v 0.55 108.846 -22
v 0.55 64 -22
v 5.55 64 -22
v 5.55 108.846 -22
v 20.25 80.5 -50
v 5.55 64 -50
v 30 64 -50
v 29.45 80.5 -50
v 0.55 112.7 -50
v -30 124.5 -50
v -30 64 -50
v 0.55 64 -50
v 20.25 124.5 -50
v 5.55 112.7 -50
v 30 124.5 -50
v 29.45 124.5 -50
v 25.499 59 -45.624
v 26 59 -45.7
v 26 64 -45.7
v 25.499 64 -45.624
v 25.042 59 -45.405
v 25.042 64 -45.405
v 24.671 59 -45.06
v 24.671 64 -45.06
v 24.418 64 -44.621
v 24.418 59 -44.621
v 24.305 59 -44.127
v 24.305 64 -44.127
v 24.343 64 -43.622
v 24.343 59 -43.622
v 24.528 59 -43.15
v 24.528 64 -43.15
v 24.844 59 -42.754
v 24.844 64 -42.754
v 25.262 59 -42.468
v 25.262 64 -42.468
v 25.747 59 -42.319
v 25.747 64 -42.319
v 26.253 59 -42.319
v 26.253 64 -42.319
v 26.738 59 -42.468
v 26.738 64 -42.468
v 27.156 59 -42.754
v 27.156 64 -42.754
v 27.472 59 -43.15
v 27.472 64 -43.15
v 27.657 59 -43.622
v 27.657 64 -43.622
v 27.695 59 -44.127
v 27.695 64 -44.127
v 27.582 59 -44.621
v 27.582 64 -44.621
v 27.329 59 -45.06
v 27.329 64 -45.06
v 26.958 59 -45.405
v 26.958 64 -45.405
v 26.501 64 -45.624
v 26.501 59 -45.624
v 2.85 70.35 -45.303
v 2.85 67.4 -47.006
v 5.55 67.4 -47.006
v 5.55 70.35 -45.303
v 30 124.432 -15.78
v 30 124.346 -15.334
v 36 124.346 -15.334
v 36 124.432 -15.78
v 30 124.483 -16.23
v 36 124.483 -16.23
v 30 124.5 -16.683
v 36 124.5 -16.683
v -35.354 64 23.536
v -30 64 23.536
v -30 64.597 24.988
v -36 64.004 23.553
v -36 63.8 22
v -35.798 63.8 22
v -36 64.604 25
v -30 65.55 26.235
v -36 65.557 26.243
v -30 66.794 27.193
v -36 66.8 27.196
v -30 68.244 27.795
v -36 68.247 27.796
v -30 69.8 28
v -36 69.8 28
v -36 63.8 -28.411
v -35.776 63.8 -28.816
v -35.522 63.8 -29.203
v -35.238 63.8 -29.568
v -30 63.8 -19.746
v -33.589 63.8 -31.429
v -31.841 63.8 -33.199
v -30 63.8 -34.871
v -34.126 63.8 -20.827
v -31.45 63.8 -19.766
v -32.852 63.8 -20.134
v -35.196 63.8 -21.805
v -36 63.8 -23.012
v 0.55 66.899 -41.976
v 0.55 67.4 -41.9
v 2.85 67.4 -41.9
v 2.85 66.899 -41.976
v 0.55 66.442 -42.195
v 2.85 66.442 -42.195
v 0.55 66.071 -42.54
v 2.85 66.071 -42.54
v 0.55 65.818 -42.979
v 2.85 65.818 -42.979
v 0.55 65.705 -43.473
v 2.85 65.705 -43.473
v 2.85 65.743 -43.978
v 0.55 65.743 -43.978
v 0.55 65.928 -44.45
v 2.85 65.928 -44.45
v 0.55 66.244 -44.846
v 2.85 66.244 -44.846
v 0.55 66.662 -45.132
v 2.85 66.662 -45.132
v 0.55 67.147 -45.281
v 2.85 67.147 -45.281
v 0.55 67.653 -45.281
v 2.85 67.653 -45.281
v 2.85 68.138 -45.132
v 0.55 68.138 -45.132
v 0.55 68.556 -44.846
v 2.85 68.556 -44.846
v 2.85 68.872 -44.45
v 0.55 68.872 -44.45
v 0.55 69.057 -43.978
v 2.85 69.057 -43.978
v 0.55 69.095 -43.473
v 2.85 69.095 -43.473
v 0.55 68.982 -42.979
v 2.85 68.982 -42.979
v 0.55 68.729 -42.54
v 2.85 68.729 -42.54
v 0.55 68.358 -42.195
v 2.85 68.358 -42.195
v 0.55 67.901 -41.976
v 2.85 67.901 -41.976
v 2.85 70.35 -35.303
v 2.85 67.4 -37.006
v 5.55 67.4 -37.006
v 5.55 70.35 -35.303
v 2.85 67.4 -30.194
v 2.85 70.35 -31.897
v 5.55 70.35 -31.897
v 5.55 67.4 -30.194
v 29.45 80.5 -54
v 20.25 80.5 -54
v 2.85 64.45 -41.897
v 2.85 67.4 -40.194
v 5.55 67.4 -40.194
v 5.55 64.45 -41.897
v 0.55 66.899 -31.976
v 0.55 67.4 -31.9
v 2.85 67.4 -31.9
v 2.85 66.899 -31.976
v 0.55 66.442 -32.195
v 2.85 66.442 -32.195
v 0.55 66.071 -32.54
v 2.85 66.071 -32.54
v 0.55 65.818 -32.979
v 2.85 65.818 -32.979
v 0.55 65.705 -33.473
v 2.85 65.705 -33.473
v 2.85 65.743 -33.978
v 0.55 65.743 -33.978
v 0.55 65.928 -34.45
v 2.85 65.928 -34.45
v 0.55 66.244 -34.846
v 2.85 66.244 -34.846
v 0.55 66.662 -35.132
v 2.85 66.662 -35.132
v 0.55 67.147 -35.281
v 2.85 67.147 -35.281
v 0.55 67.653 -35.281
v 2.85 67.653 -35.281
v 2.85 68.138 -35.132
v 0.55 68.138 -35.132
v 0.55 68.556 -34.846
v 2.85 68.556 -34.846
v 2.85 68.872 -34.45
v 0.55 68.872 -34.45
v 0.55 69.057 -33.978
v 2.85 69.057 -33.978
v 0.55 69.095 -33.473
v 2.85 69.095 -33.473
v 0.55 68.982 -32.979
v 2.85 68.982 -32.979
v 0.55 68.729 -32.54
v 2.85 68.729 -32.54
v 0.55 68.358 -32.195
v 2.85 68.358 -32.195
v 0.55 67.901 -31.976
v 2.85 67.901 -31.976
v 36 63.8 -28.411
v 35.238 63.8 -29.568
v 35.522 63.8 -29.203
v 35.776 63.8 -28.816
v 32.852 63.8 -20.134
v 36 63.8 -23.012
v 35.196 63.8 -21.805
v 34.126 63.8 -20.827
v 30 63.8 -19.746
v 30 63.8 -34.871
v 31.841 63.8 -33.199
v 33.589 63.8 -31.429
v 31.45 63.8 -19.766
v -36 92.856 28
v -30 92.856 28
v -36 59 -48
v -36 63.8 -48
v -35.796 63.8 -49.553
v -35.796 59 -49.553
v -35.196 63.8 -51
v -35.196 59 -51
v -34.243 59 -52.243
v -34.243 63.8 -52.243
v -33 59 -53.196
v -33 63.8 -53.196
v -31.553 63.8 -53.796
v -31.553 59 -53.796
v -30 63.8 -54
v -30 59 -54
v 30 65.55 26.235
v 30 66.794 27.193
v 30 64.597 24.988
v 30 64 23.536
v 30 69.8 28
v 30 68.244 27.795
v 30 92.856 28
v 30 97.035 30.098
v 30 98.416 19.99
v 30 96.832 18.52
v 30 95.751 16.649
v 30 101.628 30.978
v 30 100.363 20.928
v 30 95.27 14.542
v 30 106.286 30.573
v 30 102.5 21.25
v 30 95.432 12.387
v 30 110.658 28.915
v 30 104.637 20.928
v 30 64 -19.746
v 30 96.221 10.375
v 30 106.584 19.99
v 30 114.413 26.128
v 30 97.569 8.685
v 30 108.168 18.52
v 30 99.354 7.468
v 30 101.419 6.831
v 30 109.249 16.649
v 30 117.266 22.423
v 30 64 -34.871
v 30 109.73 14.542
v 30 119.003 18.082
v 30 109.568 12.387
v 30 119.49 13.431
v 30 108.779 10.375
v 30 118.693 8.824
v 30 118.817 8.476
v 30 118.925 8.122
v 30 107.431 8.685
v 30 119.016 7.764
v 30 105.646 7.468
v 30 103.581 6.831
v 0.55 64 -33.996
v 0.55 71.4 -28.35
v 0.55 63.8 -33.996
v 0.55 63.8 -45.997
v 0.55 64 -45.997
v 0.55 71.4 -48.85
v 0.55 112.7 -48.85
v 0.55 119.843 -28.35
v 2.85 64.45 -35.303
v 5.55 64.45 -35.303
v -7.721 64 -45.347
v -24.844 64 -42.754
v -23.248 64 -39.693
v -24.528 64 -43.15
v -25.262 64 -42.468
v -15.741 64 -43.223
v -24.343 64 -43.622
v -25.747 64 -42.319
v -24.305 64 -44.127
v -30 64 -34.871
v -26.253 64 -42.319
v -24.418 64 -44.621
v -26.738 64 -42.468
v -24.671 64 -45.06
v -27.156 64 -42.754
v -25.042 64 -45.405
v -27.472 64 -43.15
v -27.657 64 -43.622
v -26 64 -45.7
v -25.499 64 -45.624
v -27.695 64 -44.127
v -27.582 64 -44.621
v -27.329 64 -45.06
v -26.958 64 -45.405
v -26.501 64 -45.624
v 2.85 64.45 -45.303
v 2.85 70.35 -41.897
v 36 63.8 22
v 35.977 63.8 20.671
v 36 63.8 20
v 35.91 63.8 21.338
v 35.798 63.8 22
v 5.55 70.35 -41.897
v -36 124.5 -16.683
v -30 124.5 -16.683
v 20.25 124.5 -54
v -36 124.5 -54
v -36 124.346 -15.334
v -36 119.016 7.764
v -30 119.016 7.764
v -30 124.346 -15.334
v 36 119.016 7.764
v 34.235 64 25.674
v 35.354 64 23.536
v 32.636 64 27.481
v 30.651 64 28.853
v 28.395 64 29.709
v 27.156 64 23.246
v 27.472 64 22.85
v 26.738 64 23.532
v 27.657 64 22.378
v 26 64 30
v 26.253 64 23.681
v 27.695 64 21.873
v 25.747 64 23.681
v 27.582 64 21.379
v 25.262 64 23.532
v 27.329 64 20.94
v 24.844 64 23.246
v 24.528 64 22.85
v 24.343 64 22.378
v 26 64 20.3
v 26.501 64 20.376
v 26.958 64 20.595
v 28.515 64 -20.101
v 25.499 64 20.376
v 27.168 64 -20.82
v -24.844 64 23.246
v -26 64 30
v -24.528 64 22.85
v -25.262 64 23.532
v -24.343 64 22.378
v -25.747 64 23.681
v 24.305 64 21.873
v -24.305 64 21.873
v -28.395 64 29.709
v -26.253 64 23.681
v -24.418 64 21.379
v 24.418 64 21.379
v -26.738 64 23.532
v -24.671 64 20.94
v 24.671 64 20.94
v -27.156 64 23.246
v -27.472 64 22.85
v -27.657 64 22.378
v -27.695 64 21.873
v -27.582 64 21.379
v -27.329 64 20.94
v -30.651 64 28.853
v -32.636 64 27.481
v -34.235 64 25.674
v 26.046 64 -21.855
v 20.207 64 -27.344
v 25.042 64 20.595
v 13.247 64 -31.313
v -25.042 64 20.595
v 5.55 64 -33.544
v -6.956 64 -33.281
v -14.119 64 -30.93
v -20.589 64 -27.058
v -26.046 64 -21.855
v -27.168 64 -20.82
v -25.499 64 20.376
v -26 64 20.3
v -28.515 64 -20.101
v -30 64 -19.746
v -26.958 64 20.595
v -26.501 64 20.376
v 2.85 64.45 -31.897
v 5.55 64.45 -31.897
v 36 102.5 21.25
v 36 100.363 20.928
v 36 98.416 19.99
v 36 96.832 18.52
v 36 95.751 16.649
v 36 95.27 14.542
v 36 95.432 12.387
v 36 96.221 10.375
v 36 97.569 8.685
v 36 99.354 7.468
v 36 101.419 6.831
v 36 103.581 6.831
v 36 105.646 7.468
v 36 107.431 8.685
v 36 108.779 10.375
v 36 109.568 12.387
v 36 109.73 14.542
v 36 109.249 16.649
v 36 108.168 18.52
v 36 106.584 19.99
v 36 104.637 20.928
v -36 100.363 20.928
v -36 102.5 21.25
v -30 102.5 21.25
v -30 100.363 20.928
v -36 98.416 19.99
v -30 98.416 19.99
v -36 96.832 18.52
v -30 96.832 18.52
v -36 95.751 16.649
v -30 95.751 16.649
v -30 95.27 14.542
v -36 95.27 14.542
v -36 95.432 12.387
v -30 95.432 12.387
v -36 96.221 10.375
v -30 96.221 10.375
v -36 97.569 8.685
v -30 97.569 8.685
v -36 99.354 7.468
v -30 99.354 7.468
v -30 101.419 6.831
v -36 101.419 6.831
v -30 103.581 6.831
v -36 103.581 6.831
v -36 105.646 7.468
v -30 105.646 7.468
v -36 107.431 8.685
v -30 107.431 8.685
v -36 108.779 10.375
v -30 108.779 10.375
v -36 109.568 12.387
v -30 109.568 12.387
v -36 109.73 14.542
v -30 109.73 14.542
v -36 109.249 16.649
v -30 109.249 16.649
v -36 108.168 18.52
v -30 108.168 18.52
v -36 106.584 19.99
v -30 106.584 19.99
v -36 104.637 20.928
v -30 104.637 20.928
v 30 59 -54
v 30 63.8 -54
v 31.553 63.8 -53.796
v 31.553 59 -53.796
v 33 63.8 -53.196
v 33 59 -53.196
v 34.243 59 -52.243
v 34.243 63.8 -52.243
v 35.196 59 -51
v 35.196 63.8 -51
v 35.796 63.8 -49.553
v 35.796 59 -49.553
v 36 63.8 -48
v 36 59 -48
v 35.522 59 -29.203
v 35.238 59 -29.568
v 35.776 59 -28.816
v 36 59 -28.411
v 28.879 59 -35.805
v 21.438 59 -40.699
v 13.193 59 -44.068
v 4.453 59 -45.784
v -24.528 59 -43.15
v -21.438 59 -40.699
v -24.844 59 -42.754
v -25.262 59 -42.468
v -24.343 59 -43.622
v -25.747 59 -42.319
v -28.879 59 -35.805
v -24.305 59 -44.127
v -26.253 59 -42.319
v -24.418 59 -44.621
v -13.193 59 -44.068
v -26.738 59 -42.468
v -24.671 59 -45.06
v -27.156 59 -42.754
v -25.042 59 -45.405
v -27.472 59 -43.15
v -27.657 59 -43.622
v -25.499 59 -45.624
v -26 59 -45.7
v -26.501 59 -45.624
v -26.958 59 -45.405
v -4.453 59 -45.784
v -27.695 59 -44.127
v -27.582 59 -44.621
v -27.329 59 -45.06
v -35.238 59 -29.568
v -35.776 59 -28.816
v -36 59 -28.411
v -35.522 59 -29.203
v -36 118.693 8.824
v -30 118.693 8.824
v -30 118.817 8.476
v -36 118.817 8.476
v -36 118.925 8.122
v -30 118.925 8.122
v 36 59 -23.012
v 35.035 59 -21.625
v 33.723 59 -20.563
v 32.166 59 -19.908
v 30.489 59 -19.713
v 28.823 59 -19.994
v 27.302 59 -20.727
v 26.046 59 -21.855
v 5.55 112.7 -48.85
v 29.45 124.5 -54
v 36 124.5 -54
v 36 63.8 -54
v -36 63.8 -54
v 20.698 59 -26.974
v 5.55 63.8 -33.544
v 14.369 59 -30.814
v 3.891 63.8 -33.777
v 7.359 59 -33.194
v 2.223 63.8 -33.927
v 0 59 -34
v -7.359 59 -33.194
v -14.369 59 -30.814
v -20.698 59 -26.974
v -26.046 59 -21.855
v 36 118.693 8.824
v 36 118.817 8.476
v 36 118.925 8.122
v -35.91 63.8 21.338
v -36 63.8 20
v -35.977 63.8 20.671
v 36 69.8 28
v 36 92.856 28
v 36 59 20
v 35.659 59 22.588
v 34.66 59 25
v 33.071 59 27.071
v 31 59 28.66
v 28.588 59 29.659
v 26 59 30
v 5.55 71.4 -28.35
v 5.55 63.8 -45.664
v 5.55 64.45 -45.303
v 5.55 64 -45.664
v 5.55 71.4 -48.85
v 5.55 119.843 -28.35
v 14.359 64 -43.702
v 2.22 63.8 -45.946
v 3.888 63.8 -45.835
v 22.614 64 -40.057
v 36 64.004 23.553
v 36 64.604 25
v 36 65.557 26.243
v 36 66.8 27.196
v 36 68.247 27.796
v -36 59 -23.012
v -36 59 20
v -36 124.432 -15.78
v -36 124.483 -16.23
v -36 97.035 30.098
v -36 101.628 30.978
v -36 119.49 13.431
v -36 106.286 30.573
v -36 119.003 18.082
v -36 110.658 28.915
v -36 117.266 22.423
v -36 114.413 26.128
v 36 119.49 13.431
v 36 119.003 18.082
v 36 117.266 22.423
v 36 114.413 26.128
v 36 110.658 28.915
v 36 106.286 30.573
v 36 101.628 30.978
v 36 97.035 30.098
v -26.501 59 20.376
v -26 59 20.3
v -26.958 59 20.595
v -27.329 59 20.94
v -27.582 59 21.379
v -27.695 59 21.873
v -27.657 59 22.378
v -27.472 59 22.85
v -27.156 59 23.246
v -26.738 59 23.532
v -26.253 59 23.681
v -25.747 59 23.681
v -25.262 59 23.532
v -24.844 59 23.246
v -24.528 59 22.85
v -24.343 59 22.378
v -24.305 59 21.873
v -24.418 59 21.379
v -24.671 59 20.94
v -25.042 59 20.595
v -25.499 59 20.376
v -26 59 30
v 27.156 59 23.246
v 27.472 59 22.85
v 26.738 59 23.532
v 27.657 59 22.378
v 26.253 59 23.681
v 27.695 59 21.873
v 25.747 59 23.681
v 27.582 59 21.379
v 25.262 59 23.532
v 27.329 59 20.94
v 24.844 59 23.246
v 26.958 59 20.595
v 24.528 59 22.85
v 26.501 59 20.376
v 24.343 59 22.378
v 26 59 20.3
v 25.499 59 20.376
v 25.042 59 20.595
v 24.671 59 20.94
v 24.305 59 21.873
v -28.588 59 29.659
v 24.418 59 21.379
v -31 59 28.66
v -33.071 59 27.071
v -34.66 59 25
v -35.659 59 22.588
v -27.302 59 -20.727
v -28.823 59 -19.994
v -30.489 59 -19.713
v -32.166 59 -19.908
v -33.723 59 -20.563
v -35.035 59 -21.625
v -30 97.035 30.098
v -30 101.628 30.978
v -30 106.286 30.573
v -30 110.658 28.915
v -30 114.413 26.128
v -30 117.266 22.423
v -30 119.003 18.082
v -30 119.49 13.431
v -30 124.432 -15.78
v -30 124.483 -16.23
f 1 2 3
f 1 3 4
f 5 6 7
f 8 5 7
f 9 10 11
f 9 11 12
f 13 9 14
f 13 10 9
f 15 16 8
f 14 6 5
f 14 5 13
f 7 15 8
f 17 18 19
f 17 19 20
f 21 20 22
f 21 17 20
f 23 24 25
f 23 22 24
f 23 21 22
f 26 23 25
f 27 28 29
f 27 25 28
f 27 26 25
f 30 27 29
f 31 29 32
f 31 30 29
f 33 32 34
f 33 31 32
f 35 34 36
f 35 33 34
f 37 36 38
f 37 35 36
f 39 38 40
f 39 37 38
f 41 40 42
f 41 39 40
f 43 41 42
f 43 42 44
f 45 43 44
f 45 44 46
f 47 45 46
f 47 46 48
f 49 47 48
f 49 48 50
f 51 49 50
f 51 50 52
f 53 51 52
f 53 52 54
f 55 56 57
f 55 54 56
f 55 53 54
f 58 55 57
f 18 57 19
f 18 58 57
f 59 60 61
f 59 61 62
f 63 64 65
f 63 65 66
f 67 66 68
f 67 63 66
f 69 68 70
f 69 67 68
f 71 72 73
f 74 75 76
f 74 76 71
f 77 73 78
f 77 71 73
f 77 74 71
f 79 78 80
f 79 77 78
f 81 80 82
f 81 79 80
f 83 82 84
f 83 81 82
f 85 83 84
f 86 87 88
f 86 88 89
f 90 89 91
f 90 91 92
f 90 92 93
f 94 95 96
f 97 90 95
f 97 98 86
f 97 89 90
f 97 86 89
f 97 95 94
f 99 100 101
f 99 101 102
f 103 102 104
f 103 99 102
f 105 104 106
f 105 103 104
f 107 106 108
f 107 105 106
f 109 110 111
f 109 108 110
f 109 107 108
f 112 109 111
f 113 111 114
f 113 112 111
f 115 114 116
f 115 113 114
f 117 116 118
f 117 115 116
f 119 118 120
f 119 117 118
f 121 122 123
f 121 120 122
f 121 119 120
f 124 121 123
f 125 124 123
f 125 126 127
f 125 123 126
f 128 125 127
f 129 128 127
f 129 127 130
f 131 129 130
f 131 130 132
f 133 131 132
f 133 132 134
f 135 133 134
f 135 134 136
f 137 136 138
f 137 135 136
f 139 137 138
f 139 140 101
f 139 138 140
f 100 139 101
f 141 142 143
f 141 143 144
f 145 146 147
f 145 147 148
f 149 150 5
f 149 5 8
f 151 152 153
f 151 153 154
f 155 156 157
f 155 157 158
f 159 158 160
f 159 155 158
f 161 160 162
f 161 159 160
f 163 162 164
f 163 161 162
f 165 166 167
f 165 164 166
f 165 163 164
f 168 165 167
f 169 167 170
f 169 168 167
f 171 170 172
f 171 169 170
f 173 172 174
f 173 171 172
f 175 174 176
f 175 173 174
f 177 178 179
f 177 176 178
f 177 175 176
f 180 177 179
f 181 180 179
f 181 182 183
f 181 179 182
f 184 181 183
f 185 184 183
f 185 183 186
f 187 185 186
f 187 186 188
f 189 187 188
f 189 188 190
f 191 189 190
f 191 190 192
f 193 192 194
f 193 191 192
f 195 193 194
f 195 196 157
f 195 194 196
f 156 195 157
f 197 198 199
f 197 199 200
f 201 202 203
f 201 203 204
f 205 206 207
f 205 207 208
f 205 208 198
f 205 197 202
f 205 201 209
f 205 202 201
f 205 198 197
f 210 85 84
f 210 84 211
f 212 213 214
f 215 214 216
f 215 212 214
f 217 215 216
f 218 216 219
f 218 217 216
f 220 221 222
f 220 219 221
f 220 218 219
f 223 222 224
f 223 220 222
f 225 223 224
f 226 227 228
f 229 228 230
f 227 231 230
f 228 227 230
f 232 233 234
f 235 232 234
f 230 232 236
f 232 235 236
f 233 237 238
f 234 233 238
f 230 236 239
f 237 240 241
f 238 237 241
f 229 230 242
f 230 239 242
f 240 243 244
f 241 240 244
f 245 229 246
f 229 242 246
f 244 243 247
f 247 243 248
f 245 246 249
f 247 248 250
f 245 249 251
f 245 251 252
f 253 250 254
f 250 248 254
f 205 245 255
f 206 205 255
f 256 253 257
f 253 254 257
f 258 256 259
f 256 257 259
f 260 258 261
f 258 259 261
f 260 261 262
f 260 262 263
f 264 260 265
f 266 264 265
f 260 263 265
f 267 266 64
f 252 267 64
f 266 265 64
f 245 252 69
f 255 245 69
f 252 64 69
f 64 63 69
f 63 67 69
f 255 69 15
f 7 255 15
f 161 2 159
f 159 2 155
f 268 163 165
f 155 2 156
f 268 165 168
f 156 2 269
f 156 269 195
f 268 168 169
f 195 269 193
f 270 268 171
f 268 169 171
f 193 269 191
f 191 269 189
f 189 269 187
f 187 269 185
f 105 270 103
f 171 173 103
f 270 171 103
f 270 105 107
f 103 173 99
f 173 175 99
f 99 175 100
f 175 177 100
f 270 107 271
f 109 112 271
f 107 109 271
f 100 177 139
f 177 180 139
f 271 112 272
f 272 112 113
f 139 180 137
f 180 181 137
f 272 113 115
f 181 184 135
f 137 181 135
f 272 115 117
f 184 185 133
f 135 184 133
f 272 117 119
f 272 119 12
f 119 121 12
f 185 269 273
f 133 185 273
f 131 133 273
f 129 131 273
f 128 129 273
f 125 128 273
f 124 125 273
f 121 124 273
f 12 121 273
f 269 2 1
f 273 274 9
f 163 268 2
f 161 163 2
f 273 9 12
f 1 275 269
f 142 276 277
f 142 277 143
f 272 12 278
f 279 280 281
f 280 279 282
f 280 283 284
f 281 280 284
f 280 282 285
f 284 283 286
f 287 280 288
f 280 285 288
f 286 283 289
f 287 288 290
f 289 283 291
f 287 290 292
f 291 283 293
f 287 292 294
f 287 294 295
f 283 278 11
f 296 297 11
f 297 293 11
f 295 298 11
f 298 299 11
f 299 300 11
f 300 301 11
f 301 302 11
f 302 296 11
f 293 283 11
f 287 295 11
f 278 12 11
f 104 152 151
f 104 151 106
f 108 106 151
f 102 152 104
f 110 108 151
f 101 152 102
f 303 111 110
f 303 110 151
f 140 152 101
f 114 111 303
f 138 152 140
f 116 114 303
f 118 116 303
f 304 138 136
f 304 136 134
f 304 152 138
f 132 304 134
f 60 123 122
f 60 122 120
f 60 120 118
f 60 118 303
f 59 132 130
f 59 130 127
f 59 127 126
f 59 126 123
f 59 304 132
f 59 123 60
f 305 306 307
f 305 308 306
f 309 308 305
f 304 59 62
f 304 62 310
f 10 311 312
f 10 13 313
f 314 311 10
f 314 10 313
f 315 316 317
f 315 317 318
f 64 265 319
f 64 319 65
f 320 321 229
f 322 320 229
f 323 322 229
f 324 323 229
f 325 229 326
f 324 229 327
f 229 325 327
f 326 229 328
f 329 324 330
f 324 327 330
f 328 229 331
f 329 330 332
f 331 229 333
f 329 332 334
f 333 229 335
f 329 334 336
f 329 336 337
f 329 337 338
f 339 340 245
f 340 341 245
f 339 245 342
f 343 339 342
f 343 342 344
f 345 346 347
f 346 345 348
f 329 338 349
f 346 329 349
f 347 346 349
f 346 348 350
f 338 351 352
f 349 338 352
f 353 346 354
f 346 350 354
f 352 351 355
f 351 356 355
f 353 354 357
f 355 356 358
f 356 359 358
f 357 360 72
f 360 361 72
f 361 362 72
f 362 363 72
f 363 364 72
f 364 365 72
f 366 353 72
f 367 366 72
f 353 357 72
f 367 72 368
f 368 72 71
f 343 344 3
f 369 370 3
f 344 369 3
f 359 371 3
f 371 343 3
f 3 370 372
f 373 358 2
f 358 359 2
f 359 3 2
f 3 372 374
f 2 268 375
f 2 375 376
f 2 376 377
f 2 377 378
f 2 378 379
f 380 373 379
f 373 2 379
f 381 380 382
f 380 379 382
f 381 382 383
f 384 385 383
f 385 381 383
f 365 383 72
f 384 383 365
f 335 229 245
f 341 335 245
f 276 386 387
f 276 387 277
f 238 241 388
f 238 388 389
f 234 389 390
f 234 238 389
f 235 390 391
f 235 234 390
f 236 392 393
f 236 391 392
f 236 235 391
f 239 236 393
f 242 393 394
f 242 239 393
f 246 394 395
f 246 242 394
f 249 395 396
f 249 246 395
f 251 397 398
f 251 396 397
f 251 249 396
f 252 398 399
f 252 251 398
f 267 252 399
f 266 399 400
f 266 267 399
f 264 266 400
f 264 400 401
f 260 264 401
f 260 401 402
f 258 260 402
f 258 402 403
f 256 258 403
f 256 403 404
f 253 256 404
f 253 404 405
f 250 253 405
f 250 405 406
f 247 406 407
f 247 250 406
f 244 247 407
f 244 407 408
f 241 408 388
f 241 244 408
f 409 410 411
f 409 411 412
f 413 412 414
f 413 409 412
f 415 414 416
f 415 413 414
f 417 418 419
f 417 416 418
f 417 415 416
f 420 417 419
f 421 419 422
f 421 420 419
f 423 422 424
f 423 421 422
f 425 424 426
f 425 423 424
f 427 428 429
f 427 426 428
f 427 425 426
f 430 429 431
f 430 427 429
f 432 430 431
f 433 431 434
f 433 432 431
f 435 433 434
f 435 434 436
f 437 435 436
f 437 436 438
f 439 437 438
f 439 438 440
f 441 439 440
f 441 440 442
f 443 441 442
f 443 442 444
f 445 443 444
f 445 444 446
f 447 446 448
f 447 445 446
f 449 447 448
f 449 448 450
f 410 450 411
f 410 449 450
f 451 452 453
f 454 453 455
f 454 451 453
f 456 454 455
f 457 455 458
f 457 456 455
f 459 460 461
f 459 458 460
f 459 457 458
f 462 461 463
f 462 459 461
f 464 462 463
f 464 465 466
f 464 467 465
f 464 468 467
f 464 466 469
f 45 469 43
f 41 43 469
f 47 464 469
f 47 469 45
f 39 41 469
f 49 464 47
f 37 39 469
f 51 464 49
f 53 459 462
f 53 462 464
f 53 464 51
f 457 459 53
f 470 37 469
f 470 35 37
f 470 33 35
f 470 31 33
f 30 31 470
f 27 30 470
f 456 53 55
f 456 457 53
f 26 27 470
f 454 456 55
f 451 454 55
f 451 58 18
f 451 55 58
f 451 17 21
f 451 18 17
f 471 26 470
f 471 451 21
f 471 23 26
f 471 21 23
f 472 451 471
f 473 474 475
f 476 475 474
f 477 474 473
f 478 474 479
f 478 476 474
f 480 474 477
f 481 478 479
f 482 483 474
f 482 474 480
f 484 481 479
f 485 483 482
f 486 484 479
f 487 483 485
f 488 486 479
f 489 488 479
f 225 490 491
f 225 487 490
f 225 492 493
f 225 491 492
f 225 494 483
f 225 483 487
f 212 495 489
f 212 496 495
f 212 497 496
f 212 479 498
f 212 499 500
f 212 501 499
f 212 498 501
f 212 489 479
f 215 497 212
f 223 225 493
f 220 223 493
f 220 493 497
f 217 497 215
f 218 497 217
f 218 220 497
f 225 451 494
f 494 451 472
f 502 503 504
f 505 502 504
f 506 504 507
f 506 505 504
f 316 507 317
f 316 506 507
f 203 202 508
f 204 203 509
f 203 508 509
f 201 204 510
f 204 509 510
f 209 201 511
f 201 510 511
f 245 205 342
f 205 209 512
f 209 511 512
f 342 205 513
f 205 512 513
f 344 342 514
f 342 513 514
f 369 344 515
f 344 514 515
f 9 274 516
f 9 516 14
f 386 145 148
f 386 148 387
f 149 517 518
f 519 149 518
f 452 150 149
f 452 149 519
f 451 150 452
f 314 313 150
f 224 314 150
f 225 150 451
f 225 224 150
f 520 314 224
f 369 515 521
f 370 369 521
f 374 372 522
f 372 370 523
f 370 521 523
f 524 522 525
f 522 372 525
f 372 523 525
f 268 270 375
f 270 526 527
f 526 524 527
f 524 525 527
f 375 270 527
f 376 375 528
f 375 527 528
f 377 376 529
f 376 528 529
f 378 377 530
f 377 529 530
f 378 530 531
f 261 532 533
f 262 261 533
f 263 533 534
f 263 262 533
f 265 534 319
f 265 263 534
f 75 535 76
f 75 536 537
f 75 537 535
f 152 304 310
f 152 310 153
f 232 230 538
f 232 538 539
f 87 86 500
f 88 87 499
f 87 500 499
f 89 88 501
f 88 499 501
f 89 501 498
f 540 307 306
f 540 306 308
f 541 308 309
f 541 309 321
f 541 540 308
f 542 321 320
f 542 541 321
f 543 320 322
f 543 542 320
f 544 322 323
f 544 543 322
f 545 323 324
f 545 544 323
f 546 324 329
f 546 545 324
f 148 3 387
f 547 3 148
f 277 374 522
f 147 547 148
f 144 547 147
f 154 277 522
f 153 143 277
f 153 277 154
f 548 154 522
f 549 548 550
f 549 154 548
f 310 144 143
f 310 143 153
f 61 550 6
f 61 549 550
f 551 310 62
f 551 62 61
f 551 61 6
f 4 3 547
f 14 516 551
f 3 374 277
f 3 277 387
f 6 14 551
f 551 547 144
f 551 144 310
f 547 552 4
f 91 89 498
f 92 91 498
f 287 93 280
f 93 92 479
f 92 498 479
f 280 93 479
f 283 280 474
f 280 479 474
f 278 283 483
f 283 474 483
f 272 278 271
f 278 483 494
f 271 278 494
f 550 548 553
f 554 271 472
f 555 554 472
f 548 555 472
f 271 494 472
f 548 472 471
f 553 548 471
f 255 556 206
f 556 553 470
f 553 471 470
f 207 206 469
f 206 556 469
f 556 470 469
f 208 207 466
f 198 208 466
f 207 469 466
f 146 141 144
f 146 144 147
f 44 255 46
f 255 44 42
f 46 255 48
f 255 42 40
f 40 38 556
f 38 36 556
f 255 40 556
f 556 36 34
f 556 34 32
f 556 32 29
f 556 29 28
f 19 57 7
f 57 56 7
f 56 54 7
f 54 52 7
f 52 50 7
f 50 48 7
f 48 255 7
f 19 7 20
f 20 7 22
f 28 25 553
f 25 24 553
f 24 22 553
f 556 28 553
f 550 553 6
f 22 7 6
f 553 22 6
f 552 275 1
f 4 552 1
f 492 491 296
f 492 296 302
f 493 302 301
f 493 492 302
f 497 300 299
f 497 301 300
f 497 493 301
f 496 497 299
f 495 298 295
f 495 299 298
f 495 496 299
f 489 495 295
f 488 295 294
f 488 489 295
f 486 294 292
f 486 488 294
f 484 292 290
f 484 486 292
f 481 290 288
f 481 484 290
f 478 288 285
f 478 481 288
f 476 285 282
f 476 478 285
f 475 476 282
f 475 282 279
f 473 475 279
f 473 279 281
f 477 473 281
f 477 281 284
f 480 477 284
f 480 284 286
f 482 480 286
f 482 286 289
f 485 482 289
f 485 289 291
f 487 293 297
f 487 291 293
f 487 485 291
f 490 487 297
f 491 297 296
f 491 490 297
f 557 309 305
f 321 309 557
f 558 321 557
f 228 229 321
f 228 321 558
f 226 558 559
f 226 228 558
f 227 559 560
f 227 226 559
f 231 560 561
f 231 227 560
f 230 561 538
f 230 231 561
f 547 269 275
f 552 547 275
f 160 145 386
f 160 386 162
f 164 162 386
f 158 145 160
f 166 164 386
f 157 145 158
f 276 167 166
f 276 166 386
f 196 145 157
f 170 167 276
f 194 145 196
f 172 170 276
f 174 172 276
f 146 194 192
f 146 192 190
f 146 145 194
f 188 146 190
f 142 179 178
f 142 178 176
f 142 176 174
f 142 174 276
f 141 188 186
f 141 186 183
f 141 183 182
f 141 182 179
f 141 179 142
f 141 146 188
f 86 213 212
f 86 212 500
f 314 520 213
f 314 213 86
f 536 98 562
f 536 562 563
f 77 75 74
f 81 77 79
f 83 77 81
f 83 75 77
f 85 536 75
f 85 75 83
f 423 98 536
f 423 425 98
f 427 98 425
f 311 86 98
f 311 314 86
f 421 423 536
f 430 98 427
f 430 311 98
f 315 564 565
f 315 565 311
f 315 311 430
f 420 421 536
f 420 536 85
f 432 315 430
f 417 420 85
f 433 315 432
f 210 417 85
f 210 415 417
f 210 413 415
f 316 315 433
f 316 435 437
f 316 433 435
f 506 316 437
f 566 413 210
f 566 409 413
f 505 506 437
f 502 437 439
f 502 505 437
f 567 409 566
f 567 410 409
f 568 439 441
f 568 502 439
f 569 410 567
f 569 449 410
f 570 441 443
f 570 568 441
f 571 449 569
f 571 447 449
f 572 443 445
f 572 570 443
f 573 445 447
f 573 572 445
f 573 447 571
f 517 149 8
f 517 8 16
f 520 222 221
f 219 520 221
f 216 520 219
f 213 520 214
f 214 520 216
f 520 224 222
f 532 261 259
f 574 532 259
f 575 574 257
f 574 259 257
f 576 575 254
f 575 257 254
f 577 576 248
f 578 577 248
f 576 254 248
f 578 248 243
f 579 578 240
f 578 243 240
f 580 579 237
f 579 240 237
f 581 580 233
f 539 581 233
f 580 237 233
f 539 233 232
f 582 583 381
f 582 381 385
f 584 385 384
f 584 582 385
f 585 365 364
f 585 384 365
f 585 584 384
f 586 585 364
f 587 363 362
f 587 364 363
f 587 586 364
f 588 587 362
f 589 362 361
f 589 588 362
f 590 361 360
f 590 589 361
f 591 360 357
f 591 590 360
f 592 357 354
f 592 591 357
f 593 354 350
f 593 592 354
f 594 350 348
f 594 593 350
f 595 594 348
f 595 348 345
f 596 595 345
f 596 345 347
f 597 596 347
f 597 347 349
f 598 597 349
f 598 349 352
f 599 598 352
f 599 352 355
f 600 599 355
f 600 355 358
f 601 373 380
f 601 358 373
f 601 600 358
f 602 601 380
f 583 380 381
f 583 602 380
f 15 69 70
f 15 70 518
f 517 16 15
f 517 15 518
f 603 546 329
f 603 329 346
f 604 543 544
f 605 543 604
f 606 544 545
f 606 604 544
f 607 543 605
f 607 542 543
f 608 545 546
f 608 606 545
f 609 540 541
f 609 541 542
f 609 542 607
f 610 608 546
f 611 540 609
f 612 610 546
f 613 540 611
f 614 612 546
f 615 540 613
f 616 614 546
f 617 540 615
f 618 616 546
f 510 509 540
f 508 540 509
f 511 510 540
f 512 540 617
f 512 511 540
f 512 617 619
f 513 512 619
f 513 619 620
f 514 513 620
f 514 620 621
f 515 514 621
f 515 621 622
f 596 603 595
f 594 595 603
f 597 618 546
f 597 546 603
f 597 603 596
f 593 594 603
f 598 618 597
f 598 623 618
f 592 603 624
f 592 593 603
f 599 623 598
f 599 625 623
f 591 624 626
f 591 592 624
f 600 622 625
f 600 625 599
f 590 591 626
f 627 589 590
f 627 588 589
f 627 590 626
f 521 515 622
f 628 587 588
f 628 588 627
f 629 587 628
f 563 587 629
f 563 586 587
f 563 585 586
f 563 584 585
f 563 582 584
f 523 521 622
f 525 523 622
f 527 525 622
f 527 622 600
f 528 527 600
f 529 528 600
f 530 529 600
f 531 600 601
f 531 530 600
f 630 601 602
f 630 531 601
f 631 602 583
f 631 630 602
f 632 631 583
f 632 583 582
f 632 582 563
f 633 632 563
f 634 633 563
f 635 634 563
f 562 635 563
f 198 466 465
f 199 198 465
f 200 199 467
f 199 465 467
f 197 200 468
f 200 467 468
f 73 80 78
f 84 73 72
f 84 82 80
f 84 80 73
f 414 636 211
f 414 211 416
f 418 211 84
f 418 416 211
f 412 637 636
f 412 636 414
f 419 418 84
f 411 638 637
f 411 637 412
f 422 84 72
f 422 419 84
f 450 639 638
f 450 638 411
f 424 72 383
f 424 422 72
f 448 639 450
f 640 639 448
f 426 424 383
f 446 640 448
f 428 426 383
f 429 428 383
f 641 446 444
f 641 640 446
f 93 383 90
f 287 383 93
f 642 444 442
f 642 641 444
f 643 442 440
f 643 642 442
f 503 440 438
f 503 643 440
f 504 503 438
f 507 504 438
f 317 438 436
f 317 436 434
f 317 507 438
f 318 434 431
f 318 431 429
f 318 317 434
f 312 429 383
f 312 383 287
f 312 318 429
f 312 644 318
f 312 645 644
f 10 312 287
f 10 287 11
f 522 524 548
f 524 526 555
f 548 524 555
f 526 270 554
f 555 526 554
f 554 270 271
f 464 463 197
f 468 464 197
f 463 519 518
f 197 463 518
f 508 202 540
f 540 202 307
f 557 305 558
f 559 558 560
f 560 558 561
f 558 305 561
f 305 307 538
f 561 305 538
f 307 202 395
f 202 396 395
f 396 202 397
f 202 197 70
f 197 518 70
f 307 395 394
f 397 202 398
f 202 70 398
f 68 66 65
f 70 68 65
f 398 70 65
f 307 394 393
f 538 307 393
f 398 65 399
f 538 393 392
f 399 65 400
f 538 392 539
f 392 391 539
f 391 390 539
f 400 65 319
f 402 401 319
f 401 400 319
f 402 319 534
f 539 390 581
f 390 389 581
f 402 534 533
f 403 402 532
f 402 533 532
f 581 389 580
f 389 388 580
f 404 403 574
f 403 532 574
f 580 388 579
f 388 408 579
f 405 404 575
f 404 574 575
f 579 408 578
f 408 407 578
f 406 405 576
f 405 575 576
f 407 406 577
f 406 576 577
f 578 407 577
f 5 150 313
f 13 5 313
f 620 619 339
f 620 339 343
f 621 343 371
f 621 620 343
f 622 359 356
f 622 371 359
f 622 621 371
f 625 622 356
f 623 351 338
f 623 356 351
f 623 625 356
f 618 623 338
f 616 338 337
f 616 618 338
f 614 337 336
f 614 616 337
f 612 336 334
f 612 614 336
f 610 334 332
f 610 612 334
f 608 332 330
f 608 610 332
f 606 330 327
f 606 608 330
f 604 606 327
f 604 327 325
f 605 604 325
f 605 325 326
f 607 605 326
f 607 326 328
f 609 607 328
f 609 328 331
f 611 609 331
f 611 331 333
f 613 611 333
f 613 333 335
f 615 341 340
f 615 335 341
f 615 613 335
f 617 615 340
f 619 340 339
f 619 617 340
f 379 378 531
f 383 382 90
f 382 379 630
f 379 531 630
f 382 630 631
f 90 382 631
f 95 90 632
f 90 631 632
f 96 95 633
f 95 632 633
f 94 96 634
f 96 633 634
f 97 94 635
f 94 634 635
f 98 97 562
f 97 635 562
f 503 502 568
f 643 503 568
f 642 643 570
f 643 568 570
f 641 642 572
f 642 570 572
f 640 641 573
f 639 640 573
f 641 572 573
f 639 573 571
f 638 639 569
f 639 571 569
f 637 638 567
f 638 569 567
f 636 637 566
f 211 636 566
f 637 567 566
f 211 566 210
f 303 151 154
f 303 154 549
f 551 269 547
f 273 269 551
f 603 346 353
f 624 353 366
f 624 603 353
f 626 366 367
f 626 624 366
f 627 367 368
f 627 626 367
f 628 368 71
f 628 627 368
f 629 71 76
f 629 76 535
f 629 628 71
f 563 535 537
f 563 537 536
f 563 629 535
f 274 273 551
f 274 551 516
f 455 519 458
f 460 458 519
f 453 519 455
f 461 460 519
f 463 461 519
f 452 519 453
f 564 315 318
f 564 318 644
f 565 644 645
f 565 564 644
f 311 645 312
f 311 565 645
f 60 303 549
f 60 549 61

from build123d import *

# Parameters (mm, degrees)
BASE_START                                   = 59
BASE_PLATE_DEPTH                             = 5
BOLT_START                                   = 58.8
SKETCH2_R                                    = 1.7
BOLT_HOLES_CABLE_KIDNEY_DEPTH                = 5.4
CHEEK_START                                  = -36
CHEEK_X_DEPTH                                = 6
PIVOT_START                                  = -36
SKETCH4_R                                    = 17
PIVOT_BOSS_X_DEPTH                           = 6
CHEEK_START_2                                = 30
CHEEK_X_2_DEPTH                              = 6
PIVOT_START_2                                = 30
SKETCH6_R                                    = 17
PIVOT_BOSS_X_2_DEPTH                         = 6
JOURNAL_START                                = -37
SKETCH7_R                                    = 7.25
JOURNAL_BORES_DEPTH                          = 74
BACK_START                                   = -54
SKETCH8_W                                    = 72
SKETCH8_H                                    = 60.7
BACK_WALL_DEPTH                              = 4
PINION_START                                 = -55
SKETCH9_W                                    = 9.2
SKETCH9_H                                    = 45
PINION_NOTCH_DEPTH                           = 6
SERVO_START                                  = 0.55
SKETCH10_W                                   = 28.2
SKETCH10_H                                   = 58.7
SKETCH10_W_2                                 = 20.5
SKETCH10_H_2                                 = 41.5
SERVO_BULKHEAD_DEPTH                         = 5
TAB_START                                    = 0.35
SKETCH11_R                                   = 1.7
TAB_BOLT_HOLES_DEPTH                         = 5.4
TAB_START_2                                  = 2.85
TAB_NUT_POCKETS_DEPTH                        = 2.9
BULKHEAD_START                               = 0.35
BULKHEAD_CHAMFER_DEPTH                       = 5.4
HAND_START                                   = 0.35
SKETCH14_W                                   = 21.65
SKETCH14_H                                   = 13.8
HAND_FIX_BAR_OVER_THE_SERVO_WINDOW_SAW_DEPTH = 5.4


with BuildPart() as part:
    # Sketch1 → Base plate (new body)
    with BuildSketch(Plane(origin=(0, 0, 0), x_dir=(1, 0, 0), z_dir=(0, 1, 0)).offset(BASE_START)):
        with BuildLine():
            Line((-30, 54), (30, 54))
            ThreePointArc((30, 54), (34.242640687, 52.242640687), (36, 48))
            Line((36, 48), (36, -20))
            ThreePointArc((36, -20), (33.071067812, -27.071067812), (26, -30))
            Line((26, -30), (-26, -30))
            ThreePointArc((-26, -30), (-33.071067812, -27.071067812), (-36, -20))
            Line((-36, -20), (-36, 48))
            ThreePointArc((-36, 48), (-34.242640687, 52.242640687), (-30, 54))
        make_face()
    extrude(amount=BASE_PLATE_DEPTH)

    # Sketch2 → Bolt holes + cable kidney (cut)
    with BuildSketch(Plane(origin=(0, 0, 0), x_dir=(1, 0, 0), z_dir=(0, 1, 0)).offset(BOLT_START)):
        with Locations((-26, 44)):
            Circle(SKETCH2_R)
        with Locations((-26, -22)):
            Circle(SKETCH2_R)
        with Locations((26, 44)):
            Circle(SKETCH2_R)
        with Locations((26, -22)):
            Circle(SKETCH2_R)
        with BuildLine():
            ThreePointArc((-35.238044383, 29.568230046), (0, 46), (35.238044383, 29.568230046))
            ThreePointArc((35.238044383, 29.568230046), (34.498503383, 21.115237729), (26.045511066, 21.854778729))
            ThreePointArc((26.045511066, 21.854778729), (0, 34), (-26.045511066, 21.854778729))
            ThreePointArc((-26.045511066, 21.854778729), (-34.498503383, 21.115237729), (-35.238044383, 29.568230046))
        make_face()
    extrude(amount=BOLT_HOLES_CABLE_KIDNEY_DEPTH, mode=Mode.SUBTRACT)


with BuildPart() as bolt_holes_cable_kidney_piece_1:
    # of the separate pieces the step leaves, piece 1, a body of its own (bolt_holes_cable_kidney_pieces)
    add(part.part.solids().sort_by_distance((-36, 59, 20))[0])



with BuildPart() as bolt_holes_cable_kidney_piece_2:
    # of the separate pieces the step leaves, piece 2, a body of its own (bolt_holes_cable_kidney_pieces)
    add(part.part.solids().sort_by_distance((-30, 59, -54))[0])


with BuildPart() as bolt_holes_cable_kidney_piece_1_1:
    add(bolt_holes_cable_kidney_piece_1.part)

    add(bolt_holes_cable_kidney_piece_2.part)  # Cheek -X merges Bolt holes + cable kidney piece 2
    # Sketch3 → Cheek -X (add)
    with BuildSketch(Plane(origin=(0, 0, 0), x_dir=(0, 0, -1), z_dir=(1, 0, 0)).offset(CHEEK_START)):
        with BuildLine():
            Line((54, 63.8), (-22, 63.8))
            ThreePointArc((-22, 63.8), (-26.242640687, 65.557359313), (-28, 69.8))
            Line((-28, 69.8), (-28, 96.357864376))
            ThreePointArc((-28, 96.357864376), (-27.238795325, 100.1846987), (-25.071067812, 103.428932188))
            Line((-25.071067812, 103.428932188), (-11.622364452, 116.877635548))
            ThreePointArc((-11.622364452, 116.877635548), (-9.843658462, 118.217921148), (-7.764386256, 119.015910864))
            Line((-7.764386256, 119.015910864), (15.334171088, 124.346347174))
            ThreePointArc((15.334171088, 124.346347174), (16.004388899, 124.461463035), (16.683328128, 124.5))
            Line((16.683328128, 124.5), (54, 124.5))
            Line((54, 124.5), (54, 63.8))
        make_face()
    extrude(amount=CHEEK_X_DEPTH)

    # Sketch4 → Pivot boss -X (add)
    with BuildSketch(Plane(origin=(0, 0, 0), x_dir=(0, 0, -1), z_dir=(1, 0, 0)).offset(PIVOT_START)):
        with Locations((-14, 102.5)):
            Circle(SKETCH4_R)
    extrude(amount=PIVOT_BOSS_X_DEPTH)

    # Sketch5 → Cheek _X 2 (add)
    with BuildSketch(Plane(origin=(0, 0, 0), x_dir=(0, 0, -1), z_dir=(1, 0, 0)).offset(CHEEK_START_2)):
        with BuildLine():
            Line((54, 63.8), (-22, 63.8))
            ThreePointArc((-22, 63.8), (-26.242640687, 65.557359313), (-28, 69.8))
            Line((-28, 69.8), (-28, 96.357864376))
            ThreePointArc((-28, 96.357864376), (-27.238795325, 100.1846987), (-25.071067812, 103.428932188))
            Line((-25.071067812, 103.428932188), (-11.622364452, 116.877635548))
            ThreePointArc((-11.622364452, 116.877635548), (-9.843658462, 118.217921148), (-7.764386256, 119.015910864))
            Line((-7.764386256, 119.015910864), (15.334171088, 124.346347174))
            ThreePointArc((15.334171088, 124.346347174), (16.004388899, 124.461463035), (16.683328128, 124.5))
            Line((16.683328128, 124.5), (54, 124.5))
            Line((54, 124.5), (54, 63.8))
        make_face()
    extrude(amount=CHEEK_X_2_DEPTH)

    # Sketch6 → Pivot boss _X 2 (add)
    with BuildSketch(Plane(origin=(0, 0, 0), x_dir=(0, 0, -1), z_dir=(1, 0, 0)).offset(PIVOT_START_2)):
        with Locations((-14, 102.5)):
            Circle(SKETCH6_R)
    extrude(amount=PIVOT_BOSS_X_2_DEPTH)

    # Sketch7 → Journal bores (cut)
    with BuildSketch(Plane(origin=(0, 0, 0), x_dir=(0, 0, -1), z_dir=(1, 0, 0)).offset(JOURNAL_START)):
        with Locations((-14, 102.5)):
            Circle(SKETCH7_R)
    extrude(amount=JOURNAL_BORES_DEPTH, mode=Mode.SUBTRACT)

    # Sketch8 → Back wall (add)
    with BuildSketch(Plane.XY.offset(BACK_START)):
        with Locations((0, 94.15)):
            Rectangle(SKETCH8_W, SKETCH8_H)
    extrude(amount=BACK_WALL_DEPTH)

    # Sketch9 → Pinion notch (cut)
    with BuildSketch(Plane.XY.offset(PINION_START)):
        with Locations((24.85, 103)):
            Rectangle(SKETCH9_W, SKETCH9_H)
    extrude(amount=PINION_NOTCH_DEPTH, mode=Mode.SUBTRACT)

    # Sketch10 → Servo bulkhead (add)
    with BuildSketch(Plane(origin=(0, 0, 0), x_dir=(0, 0, -1), z_dir=(1, 0, 0)).offset(SERVO_START)):
        with Locations((36.1, 93.15)):
            Rectangle(SKETCH10_W, SKETCH10_H)
        with Locations((38.6, 92.15)):
            Rectangle(SKETCH10_W_2, SKETCH10_H_2, mode=Mode.SUBTRACT)
    extrude(amount=SERVO_BULKHEAD_DEPTH)

    # Sketch11 → Tab bolt holes (cut)
    with BuildSketch(Plane(origin=(0, 0, 0), x_dir=(0, 0, -1), z_dir=(1, 0, 0)).offset(TAB_START)):
        with Locations((33.6, 116.9)):
            Circle(SKETCH11_R)
        with Locations((43.6, 116.9)):
            Circle(SKETCH11_R)
        with Locations((33.6, 67.4)):
            Circle(SKETCH11_R)
        with Locations((43.6, 67.4)):
            Circle(SKETCH11_R)
    extrude(amount=TAB_BOLT_HOLES_DEPTH, mode=Mode.SUBTRACT)

    # Sketch12 → Tab nut pockets (cut)
    with BuildSketch(Plane(origin=(0, 0, 0), x_dir=(0, 0, -1), z_dir=(1, 0, 0)).offset(TAB_START_2)):
        Polygon((31.896816706, 119.85), (30.193633412, 116.9), (31.896816706, 113.95), (35.303183294, 113.95), (37.006366588, 116.9), (35.303183294, 119.85), align=None)
        Polygon((41.896816706, 119.85), (40.193633412, 116.9), (41.896816706, 113.95), (45.303183294, 113.95), (47.006366588, 116.9), (45.303183294, 119.85), align=None)
        Polygon((31.896816706, 70.35), (30.193633412, 67.4), (31.896816706, 64.45), (35.303183294, 64.45), (37.006366588, 67.4), (35.303183294, 70.35), align=None)
        Polygon((41.896816706, 70.35), (40.193633412, 67.4), (41.896816706, 64.45), (45.303183294, 64.45), (47.006366588, 67.4), (45.303183294, 70.35), align=None)
    extrude(amount=TAB_NUT_POCKETS_DEPTH, mode=Mode.SUBTRACT)

    # Sketch13 → Bulkhead chamfer (cut)
    with BuildSketch(Plane(origin=(0, 0, 0), x_dir=(0, 0, -1), z_dir=(1, 0, 0)).offset(BULKHEAD_START)):
        Polygon((21.8, 108.5), (21.8, 122.7), (30, 122.7), align=None)
    extrude(amount=BULKHEAD_CHAMFER_DEPTH, mode=Mode.SUBTRACT)

    # Sketch14 → HAND FIX - bar over the servo window sawn out (cut)
    with BuildSketch(Plane(origin=(0, 0, 0), x_dir=(0, 0, -1), z_dir=(1, 0, 0)).offset(HAND_START)):
        with Locations((39.175, 119.6)):
            Rectangle(SKETCH14_W, SKETCH14_H)
    extrude(amount=HAND_FIX_BAR_OVER_THE_SERVO_WINDOW_SAW_DEPTH, mode=Mode.SUBTRACT)


solid = bolt_holes_cable_kidney_piece_1_1.part
